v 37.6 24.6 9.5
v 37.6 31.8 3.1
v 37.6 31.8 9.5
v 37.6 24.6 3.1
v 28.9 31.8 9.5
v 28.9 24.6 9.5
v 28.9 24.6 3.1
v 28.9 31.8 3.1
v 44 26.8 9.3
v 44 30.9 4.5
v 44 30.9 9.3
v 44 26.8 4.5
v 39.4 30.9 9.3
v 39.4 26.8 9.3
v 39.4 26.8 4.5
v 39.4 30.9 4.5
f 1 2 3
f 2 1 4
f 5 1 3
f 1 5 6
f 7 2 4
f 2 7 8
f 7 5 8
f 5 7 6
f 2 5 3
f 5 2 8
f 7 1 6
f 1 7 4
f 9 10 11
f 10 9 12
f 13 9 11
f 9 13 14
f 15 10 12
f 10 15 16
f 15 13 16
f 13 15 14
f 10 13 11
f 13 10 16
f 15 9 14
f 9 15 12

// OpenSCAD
union() {
  translate([28.9, 24.6, 3.1]) cube(size=[8.7,7.2,6.4], center=false);
  translate([39.4, 26.8, 4.5]) cube(size=[4.6,4.1,4.8], center=false);
}
